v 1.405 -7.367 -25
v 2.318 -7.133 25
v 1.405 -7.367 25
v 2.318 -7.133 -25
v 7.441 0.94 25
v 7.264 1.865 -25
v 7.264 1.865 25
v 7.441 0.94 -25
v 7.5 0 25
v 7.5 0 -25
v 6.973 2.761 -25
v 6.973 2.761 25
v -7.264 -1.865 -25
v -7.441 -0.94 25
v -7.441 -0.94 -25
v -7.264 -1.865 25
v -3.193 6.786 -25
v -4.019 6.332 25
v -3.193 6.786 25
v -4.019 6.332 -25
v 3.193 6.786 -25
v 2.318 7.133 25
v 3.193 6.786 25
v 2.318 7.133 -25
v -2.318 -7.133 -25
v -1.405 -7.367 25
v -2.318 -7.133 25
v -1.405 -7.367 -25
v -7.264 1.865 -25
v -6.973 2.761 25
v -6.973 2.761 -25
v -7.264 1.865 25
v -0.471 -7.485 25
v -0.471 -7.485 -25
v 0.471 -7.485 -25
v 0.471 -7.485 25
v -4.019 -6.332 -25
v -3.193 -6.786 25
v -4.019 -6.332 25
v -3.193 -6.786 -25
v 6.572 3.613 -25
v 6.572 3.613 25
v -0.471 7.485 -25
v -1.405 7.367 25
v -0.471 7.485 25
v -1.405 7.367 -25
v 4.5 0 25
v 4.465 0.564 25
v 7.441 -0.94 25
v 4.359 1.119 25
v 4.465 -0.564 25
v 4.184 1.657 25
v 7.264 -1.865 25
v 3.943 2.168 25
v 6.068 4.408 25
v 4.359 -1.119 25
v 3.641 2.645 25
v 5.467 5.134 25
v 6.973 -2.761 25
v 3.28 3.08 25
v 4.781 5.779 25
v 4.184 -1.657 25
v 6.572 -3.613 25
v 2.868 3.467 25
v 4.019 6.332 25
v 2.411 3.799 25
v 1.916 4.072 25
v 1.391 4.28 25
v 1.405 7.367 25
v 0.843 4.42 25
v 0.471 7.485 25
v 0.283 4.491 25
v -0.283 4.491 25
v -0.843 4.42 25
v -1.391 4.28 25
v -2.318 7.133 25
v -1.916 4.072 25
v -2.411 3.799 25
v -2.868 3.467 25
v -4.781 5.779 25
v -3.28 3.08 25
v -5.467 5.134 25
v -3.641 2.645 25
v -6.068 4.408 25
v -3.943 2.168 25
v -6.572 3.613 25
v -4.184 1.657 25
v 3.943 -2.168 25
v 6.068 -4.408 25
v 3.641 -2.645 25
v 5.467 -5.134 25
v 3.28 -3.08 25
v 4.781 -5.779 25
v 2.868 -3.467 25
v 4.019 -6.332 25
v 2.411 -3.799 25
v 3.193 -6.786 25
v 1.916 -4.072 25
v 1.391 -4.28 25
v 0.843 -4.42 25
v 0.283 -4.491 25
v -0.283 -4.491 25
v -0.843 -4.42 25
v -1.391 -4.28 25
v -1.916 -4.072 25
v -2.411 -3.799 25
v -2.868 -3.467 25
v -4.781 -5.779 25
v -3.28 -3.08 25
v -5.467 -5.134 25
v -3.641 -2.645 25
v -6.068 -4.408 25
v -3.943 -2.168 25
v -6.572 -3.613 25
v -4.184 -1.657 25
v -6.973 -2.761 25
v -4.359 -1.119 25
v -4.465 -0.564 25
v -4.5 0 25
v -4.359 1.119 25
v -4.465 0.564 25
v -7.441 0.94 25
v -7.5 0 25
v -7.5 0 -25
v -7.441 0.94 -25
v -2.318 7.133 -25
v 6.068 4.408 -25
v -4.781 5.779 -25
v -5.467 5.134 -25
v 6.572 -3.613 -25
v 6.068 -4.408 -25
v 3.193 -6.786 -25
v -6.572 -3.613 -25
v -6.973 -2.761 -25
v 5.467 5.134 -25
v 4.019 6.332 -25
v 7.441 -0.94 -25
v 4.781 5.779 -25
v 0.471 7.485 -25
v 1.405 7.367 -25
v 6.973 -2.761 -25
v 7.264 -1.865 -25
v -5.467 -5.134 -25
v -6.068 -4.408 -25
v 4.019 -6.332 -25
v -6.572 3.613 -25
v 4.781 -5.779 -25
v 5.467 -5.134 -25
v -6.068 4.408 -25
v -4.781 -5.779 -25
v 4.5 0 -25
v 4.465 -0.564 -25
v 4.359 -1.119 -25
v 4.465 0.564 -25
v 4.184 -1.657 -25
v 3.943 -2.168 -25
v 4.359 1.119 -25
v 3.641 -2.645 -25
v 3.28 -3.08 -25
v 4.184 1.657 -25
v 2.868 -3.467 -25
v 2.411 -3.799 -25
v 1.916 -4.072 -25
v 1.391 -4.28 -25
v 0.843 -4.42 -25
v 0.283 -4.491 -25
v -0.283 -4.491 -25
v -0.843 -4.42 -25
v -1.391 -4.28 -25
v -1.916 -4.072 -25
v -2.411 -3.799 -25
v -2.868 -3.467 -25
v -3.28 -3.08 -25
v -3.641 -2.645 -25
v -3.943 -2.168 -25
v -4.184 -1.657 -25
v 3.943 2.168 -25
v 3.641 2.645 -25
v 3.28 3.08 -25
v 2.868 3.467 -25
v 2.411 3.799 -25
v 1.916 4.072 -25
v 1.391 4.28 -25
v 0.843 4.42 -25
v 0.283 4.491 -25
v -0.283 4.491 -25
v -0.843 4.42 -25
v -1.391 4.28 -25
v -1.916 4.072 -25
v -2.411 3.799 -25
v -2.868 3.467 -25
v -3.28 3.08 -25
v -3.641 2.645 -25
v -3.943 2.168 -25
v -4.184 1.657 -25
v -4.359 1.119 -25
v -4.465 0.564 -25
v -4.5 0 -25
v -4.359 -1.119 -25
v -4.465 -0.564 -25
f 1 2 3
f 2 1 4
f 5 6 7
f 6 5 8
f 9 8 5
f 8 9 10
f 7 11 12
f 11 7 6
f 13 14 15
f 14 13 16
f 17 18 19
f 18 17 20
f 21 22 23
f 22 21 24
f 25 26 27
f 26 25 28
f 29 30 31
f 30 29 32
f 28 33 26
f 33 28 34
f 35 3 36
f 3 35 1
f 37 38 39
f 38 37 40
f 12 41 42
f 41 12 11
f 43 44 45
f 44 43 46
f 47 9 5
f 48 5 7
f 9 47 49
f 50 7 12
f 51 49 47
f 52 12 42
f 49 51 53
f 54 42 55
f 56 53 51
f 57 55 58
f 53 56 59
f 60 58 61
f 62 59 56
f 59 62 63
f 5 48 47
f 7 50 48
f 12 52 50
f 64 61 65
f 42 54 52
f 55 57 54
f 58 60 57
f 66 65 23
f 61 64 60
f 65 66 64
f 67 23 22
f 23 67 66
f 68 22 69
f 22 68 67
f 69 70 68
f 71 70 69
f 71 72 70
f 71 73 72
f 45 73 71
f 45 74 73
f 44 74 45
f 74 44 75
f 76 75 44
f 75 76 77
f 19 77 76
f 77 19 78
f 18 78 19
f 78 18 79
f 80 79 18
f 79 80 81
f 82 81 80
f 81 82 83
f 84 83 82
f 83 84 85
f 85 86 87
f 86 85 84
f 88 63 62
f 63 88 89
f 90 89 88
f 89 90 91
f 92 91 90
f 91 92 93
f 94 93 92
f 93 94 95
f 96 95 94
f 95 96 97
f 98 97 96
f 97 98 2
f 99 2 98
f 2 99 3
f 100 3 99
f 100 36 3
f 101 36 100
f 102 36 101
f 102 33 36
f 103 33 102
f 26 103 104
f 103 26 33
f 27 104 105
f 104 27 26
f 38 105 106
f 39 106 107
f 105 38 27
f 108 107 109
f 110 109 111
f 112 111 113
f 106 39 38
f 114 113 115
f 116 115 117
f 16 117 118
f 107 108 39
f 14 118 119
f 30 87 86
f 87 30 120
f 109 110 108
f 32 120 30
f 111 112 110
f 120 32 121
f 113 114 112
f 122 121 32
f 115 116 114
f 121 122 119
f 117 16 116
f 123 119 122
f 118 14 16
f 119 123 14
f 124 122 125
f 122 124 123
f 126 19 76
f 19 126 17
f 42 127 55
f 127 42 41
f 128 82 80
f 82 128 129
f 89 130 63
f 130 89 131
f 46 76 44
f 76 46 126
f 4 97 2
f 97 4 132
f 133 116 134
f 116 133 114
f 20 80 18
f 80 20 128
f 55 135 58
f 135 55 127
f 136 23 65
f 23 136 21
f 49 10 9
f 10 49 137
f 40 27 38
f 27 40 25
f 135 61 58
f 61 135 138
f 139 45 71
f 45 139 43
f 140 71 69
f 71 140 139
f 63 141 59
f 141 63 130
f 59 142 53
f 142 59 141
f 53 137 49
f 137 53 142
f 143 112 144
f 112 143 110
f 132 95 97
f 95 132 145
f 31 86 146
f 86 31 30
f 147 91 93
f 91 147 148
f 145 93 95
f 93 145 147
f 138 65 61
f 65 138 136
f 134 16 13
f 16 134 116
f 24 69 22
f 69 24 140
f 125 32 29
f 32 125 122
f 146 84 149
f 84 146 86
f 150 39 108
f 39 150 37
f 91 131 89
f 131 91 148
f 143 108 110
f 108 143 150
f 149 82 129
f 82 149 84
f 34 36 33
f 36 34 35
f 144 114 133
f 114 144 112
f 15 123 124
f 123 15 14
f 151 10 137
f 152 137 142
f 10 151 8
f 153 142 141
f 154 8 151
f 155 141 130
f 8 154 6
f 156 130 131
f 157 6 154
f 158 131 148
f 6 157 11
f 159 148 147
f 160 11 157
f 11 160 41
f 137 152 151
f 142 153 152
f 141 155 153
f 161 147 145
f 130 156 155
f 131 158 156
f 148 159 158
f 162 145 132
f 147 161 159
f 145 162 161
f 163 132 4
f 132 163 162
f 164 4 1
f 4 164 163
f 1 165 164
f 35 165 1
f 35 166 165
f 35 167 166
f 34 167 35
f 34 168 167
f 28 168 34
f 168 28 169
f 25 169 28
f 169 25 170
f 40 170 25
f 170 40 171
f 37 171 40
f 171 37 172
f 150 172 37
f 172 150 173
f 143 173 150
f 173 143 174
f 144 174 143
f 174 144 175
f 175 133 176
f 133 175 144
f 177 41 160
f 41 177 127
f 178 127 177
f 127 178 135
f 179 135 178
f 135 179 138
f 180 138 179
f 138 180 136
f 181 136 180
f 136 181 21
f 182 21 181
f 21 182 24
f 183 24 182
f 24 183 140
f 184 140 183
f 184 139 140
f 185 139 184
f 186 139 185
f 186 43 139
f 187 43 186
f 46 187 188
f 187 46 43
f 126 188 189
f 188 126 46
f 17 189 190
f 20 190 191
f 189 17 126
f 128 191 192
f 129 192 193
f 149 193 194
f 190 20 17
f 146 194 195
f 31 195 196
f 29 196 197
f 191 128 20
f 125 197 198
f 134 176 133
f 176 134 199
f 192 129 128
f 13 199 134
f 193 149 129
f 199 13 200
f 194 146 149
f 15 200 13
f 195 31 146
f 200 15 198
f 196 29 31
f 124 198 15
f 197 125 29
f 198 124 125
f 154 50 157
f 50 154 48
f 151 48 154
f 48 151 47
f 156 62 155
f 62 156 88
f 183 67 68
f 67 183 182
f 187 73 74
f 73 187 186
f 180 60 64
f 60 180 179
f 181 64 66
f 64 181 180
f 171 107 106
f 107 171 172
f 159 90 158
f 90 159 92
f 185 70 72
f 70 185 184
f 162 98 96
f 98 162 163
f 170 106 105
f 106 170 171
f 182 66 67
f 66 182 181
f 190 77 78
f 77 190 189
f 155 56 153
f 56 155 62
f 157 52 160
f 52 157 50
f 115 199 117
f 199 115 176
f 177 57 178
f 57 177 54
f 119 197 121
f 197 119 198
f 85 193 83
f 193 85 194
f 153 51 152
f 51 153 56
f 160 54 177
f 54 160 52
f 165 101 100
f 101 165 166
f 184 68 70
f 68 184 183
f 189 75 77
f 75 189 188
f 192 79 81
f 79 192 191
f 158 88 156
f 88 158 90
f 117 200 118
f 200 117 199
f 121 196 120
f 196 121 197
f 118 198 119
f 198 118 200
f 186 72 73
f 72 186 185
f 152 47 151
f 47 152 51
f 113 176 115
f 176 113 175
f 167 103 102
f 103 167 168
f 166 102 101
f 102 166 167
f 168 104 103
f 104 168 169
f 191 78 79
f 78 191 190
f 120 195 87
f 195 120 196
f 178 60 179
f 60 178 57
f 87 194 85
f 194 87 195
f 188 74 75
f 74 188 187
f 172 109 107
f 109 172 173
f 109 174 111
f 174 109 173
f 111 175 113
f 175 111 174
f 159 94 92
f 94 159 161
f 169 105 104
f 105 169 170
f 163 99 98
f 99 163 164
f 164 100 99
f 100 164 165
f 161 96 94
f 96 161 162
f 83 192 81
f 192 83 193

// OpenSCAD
$fn = 50;


difference() {
	union() {
		translate(v = [0, 0, -25.0000000000]) {
			cylinder(h = 50, r = 7.5000000000);
		}
	}
	union() {
		translate(v = [0, 0, -100.0000000000]) {
			cylinder(h = 200, r = 4.5000000000);
		}
	}
}
